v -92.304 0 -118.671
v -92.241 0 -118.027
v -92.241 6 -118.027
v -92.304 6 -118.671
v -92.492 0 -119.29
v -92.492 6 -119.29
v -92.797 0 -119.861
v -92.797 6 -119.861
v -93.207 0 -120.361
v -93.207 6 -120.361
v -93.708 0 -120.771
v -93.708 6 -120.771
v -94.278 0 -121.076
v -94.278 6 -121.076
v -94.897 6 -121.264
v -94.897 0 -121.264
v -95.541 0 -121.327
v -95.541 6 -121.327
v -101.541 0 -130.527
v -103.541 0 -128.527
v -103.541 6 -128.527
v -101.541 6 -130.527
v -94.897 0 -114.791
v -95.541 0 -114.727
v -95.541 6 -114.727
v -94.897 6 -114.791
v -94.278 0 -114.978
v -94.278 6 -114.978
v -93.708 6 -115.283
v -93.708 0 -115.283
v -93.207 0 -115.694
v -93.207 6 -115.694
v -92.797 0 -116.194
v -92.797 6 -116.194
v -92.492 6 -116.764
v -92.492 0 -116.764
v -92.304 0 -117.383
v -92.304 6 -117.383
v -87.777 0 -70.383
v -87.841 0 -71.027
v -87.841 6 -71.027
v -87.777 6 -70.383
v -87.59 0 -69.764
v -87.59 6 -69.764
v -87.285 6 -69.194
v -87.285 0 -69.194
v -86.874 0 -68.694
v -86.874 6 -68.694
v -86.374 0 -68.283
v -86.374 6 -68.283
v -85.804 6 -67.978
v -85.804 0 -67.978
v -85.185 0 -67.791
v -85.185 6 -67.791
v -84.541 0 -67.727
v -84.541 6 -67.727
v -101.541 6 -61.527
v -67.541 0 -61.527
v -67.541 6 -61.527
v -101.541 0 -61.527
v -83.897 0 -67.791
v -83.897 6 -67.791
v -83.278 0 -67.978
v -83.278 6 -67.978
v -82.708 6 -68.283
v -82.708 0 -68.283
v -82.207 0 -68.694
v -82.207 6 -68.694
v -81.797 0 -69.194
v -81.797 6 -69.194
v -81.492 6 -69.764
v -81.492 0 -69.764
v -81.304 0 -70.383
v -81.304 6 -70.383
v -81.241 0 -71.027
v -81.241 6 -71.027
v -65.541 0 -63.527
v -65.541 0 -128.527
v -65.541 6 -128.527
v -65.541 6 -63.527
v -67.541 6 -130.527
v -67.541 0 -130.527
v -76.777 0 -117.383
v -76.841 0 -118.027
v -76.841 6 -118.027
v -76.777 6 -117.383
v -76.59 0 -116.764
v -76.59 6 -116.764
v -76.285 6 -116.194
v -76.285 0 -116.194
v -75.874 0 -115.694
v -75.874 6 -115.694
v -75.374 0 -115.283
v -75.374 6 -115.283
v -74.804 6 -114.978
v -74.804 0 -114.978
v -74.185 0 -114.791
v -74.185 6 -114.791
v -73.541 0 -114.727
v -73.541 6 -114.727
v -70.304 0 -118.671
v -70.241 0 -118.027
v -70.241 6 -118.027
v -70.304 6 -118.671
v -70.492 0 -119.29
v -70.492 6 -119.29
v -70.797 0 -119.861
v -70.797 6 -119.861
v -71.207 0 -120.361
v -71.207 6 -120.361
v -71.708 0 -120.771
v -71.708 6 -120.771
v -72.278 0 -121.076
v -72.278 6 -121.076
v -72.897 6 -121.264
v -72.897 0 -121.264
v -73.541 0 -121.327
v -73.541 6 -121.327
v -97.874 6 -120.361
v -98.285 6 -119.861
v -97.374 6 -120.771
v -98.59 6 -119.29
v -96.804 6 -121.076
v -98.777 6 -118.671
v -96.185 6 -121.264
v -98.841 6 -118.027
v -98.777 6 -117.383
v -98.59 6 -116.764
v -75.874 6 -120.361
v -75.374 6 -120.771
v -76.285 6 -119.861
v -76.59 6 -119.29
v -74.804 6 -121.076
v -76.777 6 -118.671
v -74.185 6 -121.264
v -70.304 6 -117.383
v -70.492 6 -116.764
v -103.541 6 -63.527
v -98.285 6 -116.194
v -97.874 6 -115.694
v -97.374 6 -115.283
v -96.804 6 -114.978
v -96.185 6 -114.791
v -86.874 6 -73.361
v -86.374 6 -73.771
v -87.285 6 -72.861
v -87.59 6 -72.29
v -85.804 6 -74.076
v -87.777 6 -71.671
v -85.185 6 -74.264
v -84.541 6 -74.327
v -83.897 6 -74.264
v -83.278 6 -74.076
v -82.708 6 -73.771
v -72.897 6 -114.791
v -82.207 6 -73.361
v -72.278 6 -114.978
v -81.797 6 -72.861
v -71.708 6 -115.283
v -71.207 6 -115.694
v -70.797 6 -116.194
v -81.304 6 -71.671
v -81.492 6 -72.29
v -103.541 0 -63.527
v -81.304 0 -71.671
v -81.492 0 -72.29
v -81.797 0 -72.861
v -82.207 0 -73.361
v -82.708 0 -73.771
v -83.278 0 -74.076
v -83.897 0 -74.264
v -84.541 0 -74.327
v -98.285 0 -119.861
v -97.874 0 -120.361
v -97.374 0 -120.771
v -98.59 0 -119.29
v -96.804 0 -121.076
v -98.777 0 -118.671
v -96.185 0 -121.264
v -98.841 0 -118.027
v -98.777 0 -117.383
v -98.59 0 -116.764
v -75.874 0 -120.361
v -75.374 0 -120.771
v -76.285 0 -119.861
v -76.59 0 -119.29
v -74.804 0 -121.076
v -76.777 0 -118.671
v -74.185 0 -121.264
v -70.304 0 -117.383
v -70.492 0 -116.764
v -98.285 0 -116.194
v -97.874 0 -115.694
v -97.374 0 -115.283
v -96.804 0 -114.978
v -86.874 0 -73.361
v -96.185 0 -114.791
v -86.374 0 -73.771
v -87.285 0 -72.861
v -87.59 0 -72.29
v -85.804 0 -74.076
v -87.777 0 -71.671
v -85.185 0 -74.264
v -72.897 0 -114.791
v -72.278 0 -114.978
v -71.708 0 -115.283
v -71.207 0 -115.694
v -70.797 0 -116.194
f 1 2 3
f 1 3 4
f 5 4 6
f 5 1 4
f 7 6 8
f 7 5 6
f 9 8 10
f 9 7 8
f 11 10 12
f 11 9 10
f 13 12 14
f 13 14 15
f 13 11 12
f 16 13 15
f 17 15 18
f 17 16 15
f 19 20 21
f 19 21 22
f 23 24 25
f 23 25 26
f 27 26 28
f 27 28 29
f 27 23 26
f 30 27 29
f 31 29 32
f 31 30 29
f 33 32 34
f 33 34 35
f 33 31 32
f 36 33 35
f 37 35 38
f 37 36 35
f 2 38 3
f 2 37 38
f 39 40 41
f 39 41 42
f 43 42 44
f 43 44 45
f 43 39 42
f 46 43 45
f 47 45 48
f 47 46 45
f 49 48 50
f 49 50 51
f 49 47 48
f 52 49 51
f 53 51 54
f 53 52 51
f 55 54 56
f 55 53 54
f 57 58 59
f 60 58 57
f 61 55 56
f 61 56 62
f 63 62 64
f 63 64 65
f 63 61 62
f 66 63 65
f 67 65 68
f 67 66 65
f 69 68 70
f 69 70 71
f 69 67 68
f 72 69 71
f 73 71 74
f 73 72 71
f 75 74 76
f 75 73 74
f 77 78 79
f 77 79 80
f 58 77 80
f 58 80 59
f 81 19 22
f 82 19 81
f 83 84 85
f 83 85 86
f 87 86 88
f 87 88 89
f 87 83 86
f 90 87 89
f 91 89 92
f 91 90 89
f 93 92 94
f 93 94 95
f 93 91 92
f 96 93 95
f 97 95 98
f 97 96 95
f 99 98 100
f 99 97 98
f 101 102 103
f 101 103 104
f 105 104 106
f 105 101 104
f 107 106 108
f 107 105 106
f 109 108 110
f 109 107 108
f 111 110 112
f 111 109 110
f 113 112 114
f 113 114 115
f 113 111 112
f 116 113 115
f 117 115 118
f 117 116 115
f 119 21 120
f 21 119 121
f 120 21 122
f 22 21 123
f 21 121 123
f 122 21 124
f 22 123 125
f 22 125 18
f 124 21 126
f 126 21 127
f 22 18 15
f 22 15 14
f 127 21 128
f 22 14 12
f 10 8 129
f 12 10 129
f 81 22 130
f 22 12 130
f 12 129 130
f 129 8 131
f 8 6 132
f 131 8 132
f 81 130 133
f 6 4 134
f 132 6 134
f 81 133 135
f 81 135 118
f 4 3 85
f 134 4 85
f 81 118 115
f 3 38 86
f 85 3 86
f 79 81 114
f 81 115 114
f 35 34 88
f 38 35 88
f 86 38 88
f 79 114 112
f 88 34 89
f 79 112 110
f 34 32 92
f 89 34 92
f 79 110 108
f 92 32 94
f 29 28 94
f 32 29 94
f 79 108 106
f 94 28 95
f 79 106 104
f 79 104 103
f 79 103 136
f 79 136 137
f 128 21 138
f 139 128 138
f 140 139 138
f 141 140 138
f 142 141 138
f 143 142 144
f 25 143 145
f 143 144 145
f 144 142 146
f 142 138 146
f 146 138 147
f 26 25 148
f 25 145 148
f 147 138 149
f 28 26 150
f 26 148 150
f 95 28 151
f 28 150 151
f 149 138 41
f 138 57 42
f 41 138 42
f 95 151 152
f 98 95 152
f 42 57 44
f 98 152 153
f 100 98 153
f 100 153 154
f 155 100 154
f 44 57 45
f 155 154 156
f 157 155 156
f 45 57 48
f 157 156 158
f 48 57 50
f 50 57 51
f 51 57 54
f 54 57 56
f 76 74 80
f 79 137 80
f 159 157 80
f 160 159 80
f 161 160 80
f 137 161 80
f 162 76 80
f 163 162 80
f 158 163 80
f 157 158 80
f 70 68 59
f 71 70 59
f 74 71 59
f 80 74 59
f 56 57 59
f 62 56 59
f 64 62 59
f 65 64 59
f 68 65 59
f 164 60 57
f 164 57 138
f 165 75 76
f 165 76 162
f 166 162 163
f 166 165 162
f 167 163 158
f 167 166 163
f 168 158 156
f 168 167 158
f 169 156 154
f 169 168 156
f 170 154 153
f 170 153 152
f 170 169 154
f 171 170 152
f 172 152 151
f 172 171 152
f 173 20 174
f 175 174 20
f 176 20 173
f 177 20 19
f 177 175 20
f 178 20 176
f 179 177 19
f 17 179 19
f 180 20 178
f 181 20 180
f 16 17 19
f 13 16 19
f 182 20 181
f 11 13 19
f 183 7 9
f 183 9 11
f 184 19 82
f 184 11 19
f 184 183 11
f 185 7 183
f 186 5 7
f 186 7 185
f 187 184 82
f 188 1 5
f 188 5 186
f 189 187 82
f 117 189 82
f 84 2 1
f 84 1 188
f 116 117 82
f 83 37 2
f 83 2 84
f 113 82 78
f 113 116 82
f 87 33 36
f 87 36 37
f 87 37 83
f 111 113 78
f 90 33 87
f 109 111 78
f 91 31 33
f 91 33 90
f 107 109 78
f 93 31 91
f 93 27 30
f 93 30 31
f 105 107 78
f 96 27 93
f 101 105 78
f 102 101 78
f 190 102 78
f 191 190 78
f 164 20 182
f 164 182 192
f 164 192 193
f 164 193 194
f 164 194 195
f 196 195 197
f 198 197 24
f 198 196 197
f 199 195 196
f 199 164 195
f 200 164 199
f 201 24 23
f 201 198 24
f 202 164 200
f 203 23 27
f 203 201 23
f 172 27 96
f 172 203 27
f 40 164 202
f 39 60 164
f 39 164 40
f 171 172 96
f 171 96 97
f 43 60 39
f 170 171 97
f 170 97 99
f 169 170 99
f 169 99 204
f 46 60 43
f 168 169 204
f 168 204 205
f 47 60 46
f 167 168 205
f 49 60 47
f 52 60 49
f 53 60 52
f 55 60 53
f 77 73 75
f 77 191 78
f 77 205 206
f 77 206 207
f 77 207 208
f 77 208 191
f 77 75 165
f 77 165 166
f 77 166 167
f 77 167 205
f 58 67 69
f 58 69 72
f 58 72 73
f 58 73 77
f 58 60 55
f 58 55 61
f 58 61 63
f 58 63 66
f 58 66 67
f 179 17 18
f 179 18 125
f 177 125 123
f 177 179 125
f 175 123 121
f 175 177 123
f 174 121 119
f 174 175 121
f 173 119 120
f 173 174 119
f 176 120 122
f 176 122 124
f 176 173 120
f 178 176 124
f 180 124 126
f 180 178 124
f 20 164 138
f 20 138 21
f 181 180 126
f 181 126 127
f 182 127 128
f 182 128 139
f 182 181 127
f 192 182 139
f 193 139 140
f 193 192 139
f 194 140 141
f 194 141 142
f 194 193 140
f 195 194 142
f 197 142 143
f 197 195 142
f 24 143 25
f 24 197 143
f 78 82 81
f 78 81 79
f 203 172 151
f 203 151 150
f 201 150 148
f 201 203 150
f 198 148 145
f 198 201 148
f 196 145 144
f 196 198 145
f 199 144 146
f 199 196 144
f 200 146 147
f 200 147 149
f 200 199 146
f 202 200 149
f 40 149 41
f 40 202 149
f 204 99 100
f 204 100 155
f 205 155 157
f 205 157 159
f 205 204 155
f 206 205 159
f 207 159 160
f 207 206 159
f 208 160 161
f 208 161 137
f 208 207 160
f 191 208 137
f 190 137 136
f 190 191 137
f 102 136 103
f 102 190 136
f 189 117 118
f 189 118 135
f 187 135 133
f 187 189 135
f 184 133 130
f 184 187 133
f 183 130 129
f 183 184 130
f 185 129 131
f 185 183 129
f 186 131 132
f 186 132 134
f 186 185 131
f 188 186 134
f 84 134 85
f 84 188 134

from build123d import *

# Parameters (mm, degrees)
F1_DEPTH = 6


with BuildPart() as f1:
    # F0 (on Front) → F1 (new body)
    with BuildSketch(Plane.XZ):
        Polygon((-65.540905, -63.527275), (-67.540905, -61.527275), (-101.540905, -61.527275), (-103.540905, -63.527275), (-103.540905, -128.527275), (-101.540905, -130.527275), (-67.540905, -130.527275), (-65.540905, -128.527275), align=None)
        with BuildLine():
            ThreePointArc((-95.540905, -121.327275), (-97.874357, -120.360727), (-98.840905, -118.027275))
            ThreePointArc((-98.840905, -118.027275), (-97.874357, -115.693823), (-95.540905, -114.727275))
            ThreePointArc((-95.540905, -114.727275), (-93.207453, -115.693823), (-92.240905, -118.027275))
            ThreePointArc((-92.240905, -118.027275), (-93.207453, -120.360727), (-95.540905, -121.327275))
        make_face(mode=Mode.SUBTRACT)
        with BuildLine():
            ThreePointArc((-73.540905, -121.327275), (-75.874357, -120.360727), (-76.840905, -118.027275))
            ThreePointArc((-76.840905, -118.027275), (-75.874357, -115.693823), (-73.540905, -114.727275))
            ThreePointArc((-73.540905, -114.727275), (-71.207453, -115.693823), (-70.240905, -118.027275))
            ThreePointArc((-70.240905, -118.027275), (-71.207453, -120.360727), (-73.540905, -121.327275))
        make_face(mode=Mode.SUBTRACT)
        with BuildLine():
            ThreePointArc((-84.540905, -74.327275), (-86.874357, -73.360727), (-87.840905, -71.027275))
            ThreePointArc((-87.840905, -71.027275), (-86.874357, -68.693823), (-84.540905, -67.727275))
            ThreePointArc((-84.540905, -67.727275), (-82.207453, -68.693823), (-81.240905, -71.027275))
            ThreePointArc((-81.240905, -71.027275), (-82.207453, -73.360727), (-84.540905, -74.327275))
        make_face(mode=Mode.SUBTRACT)
    extrude(amount=-F1_DEPTH)


solid = f1.part
